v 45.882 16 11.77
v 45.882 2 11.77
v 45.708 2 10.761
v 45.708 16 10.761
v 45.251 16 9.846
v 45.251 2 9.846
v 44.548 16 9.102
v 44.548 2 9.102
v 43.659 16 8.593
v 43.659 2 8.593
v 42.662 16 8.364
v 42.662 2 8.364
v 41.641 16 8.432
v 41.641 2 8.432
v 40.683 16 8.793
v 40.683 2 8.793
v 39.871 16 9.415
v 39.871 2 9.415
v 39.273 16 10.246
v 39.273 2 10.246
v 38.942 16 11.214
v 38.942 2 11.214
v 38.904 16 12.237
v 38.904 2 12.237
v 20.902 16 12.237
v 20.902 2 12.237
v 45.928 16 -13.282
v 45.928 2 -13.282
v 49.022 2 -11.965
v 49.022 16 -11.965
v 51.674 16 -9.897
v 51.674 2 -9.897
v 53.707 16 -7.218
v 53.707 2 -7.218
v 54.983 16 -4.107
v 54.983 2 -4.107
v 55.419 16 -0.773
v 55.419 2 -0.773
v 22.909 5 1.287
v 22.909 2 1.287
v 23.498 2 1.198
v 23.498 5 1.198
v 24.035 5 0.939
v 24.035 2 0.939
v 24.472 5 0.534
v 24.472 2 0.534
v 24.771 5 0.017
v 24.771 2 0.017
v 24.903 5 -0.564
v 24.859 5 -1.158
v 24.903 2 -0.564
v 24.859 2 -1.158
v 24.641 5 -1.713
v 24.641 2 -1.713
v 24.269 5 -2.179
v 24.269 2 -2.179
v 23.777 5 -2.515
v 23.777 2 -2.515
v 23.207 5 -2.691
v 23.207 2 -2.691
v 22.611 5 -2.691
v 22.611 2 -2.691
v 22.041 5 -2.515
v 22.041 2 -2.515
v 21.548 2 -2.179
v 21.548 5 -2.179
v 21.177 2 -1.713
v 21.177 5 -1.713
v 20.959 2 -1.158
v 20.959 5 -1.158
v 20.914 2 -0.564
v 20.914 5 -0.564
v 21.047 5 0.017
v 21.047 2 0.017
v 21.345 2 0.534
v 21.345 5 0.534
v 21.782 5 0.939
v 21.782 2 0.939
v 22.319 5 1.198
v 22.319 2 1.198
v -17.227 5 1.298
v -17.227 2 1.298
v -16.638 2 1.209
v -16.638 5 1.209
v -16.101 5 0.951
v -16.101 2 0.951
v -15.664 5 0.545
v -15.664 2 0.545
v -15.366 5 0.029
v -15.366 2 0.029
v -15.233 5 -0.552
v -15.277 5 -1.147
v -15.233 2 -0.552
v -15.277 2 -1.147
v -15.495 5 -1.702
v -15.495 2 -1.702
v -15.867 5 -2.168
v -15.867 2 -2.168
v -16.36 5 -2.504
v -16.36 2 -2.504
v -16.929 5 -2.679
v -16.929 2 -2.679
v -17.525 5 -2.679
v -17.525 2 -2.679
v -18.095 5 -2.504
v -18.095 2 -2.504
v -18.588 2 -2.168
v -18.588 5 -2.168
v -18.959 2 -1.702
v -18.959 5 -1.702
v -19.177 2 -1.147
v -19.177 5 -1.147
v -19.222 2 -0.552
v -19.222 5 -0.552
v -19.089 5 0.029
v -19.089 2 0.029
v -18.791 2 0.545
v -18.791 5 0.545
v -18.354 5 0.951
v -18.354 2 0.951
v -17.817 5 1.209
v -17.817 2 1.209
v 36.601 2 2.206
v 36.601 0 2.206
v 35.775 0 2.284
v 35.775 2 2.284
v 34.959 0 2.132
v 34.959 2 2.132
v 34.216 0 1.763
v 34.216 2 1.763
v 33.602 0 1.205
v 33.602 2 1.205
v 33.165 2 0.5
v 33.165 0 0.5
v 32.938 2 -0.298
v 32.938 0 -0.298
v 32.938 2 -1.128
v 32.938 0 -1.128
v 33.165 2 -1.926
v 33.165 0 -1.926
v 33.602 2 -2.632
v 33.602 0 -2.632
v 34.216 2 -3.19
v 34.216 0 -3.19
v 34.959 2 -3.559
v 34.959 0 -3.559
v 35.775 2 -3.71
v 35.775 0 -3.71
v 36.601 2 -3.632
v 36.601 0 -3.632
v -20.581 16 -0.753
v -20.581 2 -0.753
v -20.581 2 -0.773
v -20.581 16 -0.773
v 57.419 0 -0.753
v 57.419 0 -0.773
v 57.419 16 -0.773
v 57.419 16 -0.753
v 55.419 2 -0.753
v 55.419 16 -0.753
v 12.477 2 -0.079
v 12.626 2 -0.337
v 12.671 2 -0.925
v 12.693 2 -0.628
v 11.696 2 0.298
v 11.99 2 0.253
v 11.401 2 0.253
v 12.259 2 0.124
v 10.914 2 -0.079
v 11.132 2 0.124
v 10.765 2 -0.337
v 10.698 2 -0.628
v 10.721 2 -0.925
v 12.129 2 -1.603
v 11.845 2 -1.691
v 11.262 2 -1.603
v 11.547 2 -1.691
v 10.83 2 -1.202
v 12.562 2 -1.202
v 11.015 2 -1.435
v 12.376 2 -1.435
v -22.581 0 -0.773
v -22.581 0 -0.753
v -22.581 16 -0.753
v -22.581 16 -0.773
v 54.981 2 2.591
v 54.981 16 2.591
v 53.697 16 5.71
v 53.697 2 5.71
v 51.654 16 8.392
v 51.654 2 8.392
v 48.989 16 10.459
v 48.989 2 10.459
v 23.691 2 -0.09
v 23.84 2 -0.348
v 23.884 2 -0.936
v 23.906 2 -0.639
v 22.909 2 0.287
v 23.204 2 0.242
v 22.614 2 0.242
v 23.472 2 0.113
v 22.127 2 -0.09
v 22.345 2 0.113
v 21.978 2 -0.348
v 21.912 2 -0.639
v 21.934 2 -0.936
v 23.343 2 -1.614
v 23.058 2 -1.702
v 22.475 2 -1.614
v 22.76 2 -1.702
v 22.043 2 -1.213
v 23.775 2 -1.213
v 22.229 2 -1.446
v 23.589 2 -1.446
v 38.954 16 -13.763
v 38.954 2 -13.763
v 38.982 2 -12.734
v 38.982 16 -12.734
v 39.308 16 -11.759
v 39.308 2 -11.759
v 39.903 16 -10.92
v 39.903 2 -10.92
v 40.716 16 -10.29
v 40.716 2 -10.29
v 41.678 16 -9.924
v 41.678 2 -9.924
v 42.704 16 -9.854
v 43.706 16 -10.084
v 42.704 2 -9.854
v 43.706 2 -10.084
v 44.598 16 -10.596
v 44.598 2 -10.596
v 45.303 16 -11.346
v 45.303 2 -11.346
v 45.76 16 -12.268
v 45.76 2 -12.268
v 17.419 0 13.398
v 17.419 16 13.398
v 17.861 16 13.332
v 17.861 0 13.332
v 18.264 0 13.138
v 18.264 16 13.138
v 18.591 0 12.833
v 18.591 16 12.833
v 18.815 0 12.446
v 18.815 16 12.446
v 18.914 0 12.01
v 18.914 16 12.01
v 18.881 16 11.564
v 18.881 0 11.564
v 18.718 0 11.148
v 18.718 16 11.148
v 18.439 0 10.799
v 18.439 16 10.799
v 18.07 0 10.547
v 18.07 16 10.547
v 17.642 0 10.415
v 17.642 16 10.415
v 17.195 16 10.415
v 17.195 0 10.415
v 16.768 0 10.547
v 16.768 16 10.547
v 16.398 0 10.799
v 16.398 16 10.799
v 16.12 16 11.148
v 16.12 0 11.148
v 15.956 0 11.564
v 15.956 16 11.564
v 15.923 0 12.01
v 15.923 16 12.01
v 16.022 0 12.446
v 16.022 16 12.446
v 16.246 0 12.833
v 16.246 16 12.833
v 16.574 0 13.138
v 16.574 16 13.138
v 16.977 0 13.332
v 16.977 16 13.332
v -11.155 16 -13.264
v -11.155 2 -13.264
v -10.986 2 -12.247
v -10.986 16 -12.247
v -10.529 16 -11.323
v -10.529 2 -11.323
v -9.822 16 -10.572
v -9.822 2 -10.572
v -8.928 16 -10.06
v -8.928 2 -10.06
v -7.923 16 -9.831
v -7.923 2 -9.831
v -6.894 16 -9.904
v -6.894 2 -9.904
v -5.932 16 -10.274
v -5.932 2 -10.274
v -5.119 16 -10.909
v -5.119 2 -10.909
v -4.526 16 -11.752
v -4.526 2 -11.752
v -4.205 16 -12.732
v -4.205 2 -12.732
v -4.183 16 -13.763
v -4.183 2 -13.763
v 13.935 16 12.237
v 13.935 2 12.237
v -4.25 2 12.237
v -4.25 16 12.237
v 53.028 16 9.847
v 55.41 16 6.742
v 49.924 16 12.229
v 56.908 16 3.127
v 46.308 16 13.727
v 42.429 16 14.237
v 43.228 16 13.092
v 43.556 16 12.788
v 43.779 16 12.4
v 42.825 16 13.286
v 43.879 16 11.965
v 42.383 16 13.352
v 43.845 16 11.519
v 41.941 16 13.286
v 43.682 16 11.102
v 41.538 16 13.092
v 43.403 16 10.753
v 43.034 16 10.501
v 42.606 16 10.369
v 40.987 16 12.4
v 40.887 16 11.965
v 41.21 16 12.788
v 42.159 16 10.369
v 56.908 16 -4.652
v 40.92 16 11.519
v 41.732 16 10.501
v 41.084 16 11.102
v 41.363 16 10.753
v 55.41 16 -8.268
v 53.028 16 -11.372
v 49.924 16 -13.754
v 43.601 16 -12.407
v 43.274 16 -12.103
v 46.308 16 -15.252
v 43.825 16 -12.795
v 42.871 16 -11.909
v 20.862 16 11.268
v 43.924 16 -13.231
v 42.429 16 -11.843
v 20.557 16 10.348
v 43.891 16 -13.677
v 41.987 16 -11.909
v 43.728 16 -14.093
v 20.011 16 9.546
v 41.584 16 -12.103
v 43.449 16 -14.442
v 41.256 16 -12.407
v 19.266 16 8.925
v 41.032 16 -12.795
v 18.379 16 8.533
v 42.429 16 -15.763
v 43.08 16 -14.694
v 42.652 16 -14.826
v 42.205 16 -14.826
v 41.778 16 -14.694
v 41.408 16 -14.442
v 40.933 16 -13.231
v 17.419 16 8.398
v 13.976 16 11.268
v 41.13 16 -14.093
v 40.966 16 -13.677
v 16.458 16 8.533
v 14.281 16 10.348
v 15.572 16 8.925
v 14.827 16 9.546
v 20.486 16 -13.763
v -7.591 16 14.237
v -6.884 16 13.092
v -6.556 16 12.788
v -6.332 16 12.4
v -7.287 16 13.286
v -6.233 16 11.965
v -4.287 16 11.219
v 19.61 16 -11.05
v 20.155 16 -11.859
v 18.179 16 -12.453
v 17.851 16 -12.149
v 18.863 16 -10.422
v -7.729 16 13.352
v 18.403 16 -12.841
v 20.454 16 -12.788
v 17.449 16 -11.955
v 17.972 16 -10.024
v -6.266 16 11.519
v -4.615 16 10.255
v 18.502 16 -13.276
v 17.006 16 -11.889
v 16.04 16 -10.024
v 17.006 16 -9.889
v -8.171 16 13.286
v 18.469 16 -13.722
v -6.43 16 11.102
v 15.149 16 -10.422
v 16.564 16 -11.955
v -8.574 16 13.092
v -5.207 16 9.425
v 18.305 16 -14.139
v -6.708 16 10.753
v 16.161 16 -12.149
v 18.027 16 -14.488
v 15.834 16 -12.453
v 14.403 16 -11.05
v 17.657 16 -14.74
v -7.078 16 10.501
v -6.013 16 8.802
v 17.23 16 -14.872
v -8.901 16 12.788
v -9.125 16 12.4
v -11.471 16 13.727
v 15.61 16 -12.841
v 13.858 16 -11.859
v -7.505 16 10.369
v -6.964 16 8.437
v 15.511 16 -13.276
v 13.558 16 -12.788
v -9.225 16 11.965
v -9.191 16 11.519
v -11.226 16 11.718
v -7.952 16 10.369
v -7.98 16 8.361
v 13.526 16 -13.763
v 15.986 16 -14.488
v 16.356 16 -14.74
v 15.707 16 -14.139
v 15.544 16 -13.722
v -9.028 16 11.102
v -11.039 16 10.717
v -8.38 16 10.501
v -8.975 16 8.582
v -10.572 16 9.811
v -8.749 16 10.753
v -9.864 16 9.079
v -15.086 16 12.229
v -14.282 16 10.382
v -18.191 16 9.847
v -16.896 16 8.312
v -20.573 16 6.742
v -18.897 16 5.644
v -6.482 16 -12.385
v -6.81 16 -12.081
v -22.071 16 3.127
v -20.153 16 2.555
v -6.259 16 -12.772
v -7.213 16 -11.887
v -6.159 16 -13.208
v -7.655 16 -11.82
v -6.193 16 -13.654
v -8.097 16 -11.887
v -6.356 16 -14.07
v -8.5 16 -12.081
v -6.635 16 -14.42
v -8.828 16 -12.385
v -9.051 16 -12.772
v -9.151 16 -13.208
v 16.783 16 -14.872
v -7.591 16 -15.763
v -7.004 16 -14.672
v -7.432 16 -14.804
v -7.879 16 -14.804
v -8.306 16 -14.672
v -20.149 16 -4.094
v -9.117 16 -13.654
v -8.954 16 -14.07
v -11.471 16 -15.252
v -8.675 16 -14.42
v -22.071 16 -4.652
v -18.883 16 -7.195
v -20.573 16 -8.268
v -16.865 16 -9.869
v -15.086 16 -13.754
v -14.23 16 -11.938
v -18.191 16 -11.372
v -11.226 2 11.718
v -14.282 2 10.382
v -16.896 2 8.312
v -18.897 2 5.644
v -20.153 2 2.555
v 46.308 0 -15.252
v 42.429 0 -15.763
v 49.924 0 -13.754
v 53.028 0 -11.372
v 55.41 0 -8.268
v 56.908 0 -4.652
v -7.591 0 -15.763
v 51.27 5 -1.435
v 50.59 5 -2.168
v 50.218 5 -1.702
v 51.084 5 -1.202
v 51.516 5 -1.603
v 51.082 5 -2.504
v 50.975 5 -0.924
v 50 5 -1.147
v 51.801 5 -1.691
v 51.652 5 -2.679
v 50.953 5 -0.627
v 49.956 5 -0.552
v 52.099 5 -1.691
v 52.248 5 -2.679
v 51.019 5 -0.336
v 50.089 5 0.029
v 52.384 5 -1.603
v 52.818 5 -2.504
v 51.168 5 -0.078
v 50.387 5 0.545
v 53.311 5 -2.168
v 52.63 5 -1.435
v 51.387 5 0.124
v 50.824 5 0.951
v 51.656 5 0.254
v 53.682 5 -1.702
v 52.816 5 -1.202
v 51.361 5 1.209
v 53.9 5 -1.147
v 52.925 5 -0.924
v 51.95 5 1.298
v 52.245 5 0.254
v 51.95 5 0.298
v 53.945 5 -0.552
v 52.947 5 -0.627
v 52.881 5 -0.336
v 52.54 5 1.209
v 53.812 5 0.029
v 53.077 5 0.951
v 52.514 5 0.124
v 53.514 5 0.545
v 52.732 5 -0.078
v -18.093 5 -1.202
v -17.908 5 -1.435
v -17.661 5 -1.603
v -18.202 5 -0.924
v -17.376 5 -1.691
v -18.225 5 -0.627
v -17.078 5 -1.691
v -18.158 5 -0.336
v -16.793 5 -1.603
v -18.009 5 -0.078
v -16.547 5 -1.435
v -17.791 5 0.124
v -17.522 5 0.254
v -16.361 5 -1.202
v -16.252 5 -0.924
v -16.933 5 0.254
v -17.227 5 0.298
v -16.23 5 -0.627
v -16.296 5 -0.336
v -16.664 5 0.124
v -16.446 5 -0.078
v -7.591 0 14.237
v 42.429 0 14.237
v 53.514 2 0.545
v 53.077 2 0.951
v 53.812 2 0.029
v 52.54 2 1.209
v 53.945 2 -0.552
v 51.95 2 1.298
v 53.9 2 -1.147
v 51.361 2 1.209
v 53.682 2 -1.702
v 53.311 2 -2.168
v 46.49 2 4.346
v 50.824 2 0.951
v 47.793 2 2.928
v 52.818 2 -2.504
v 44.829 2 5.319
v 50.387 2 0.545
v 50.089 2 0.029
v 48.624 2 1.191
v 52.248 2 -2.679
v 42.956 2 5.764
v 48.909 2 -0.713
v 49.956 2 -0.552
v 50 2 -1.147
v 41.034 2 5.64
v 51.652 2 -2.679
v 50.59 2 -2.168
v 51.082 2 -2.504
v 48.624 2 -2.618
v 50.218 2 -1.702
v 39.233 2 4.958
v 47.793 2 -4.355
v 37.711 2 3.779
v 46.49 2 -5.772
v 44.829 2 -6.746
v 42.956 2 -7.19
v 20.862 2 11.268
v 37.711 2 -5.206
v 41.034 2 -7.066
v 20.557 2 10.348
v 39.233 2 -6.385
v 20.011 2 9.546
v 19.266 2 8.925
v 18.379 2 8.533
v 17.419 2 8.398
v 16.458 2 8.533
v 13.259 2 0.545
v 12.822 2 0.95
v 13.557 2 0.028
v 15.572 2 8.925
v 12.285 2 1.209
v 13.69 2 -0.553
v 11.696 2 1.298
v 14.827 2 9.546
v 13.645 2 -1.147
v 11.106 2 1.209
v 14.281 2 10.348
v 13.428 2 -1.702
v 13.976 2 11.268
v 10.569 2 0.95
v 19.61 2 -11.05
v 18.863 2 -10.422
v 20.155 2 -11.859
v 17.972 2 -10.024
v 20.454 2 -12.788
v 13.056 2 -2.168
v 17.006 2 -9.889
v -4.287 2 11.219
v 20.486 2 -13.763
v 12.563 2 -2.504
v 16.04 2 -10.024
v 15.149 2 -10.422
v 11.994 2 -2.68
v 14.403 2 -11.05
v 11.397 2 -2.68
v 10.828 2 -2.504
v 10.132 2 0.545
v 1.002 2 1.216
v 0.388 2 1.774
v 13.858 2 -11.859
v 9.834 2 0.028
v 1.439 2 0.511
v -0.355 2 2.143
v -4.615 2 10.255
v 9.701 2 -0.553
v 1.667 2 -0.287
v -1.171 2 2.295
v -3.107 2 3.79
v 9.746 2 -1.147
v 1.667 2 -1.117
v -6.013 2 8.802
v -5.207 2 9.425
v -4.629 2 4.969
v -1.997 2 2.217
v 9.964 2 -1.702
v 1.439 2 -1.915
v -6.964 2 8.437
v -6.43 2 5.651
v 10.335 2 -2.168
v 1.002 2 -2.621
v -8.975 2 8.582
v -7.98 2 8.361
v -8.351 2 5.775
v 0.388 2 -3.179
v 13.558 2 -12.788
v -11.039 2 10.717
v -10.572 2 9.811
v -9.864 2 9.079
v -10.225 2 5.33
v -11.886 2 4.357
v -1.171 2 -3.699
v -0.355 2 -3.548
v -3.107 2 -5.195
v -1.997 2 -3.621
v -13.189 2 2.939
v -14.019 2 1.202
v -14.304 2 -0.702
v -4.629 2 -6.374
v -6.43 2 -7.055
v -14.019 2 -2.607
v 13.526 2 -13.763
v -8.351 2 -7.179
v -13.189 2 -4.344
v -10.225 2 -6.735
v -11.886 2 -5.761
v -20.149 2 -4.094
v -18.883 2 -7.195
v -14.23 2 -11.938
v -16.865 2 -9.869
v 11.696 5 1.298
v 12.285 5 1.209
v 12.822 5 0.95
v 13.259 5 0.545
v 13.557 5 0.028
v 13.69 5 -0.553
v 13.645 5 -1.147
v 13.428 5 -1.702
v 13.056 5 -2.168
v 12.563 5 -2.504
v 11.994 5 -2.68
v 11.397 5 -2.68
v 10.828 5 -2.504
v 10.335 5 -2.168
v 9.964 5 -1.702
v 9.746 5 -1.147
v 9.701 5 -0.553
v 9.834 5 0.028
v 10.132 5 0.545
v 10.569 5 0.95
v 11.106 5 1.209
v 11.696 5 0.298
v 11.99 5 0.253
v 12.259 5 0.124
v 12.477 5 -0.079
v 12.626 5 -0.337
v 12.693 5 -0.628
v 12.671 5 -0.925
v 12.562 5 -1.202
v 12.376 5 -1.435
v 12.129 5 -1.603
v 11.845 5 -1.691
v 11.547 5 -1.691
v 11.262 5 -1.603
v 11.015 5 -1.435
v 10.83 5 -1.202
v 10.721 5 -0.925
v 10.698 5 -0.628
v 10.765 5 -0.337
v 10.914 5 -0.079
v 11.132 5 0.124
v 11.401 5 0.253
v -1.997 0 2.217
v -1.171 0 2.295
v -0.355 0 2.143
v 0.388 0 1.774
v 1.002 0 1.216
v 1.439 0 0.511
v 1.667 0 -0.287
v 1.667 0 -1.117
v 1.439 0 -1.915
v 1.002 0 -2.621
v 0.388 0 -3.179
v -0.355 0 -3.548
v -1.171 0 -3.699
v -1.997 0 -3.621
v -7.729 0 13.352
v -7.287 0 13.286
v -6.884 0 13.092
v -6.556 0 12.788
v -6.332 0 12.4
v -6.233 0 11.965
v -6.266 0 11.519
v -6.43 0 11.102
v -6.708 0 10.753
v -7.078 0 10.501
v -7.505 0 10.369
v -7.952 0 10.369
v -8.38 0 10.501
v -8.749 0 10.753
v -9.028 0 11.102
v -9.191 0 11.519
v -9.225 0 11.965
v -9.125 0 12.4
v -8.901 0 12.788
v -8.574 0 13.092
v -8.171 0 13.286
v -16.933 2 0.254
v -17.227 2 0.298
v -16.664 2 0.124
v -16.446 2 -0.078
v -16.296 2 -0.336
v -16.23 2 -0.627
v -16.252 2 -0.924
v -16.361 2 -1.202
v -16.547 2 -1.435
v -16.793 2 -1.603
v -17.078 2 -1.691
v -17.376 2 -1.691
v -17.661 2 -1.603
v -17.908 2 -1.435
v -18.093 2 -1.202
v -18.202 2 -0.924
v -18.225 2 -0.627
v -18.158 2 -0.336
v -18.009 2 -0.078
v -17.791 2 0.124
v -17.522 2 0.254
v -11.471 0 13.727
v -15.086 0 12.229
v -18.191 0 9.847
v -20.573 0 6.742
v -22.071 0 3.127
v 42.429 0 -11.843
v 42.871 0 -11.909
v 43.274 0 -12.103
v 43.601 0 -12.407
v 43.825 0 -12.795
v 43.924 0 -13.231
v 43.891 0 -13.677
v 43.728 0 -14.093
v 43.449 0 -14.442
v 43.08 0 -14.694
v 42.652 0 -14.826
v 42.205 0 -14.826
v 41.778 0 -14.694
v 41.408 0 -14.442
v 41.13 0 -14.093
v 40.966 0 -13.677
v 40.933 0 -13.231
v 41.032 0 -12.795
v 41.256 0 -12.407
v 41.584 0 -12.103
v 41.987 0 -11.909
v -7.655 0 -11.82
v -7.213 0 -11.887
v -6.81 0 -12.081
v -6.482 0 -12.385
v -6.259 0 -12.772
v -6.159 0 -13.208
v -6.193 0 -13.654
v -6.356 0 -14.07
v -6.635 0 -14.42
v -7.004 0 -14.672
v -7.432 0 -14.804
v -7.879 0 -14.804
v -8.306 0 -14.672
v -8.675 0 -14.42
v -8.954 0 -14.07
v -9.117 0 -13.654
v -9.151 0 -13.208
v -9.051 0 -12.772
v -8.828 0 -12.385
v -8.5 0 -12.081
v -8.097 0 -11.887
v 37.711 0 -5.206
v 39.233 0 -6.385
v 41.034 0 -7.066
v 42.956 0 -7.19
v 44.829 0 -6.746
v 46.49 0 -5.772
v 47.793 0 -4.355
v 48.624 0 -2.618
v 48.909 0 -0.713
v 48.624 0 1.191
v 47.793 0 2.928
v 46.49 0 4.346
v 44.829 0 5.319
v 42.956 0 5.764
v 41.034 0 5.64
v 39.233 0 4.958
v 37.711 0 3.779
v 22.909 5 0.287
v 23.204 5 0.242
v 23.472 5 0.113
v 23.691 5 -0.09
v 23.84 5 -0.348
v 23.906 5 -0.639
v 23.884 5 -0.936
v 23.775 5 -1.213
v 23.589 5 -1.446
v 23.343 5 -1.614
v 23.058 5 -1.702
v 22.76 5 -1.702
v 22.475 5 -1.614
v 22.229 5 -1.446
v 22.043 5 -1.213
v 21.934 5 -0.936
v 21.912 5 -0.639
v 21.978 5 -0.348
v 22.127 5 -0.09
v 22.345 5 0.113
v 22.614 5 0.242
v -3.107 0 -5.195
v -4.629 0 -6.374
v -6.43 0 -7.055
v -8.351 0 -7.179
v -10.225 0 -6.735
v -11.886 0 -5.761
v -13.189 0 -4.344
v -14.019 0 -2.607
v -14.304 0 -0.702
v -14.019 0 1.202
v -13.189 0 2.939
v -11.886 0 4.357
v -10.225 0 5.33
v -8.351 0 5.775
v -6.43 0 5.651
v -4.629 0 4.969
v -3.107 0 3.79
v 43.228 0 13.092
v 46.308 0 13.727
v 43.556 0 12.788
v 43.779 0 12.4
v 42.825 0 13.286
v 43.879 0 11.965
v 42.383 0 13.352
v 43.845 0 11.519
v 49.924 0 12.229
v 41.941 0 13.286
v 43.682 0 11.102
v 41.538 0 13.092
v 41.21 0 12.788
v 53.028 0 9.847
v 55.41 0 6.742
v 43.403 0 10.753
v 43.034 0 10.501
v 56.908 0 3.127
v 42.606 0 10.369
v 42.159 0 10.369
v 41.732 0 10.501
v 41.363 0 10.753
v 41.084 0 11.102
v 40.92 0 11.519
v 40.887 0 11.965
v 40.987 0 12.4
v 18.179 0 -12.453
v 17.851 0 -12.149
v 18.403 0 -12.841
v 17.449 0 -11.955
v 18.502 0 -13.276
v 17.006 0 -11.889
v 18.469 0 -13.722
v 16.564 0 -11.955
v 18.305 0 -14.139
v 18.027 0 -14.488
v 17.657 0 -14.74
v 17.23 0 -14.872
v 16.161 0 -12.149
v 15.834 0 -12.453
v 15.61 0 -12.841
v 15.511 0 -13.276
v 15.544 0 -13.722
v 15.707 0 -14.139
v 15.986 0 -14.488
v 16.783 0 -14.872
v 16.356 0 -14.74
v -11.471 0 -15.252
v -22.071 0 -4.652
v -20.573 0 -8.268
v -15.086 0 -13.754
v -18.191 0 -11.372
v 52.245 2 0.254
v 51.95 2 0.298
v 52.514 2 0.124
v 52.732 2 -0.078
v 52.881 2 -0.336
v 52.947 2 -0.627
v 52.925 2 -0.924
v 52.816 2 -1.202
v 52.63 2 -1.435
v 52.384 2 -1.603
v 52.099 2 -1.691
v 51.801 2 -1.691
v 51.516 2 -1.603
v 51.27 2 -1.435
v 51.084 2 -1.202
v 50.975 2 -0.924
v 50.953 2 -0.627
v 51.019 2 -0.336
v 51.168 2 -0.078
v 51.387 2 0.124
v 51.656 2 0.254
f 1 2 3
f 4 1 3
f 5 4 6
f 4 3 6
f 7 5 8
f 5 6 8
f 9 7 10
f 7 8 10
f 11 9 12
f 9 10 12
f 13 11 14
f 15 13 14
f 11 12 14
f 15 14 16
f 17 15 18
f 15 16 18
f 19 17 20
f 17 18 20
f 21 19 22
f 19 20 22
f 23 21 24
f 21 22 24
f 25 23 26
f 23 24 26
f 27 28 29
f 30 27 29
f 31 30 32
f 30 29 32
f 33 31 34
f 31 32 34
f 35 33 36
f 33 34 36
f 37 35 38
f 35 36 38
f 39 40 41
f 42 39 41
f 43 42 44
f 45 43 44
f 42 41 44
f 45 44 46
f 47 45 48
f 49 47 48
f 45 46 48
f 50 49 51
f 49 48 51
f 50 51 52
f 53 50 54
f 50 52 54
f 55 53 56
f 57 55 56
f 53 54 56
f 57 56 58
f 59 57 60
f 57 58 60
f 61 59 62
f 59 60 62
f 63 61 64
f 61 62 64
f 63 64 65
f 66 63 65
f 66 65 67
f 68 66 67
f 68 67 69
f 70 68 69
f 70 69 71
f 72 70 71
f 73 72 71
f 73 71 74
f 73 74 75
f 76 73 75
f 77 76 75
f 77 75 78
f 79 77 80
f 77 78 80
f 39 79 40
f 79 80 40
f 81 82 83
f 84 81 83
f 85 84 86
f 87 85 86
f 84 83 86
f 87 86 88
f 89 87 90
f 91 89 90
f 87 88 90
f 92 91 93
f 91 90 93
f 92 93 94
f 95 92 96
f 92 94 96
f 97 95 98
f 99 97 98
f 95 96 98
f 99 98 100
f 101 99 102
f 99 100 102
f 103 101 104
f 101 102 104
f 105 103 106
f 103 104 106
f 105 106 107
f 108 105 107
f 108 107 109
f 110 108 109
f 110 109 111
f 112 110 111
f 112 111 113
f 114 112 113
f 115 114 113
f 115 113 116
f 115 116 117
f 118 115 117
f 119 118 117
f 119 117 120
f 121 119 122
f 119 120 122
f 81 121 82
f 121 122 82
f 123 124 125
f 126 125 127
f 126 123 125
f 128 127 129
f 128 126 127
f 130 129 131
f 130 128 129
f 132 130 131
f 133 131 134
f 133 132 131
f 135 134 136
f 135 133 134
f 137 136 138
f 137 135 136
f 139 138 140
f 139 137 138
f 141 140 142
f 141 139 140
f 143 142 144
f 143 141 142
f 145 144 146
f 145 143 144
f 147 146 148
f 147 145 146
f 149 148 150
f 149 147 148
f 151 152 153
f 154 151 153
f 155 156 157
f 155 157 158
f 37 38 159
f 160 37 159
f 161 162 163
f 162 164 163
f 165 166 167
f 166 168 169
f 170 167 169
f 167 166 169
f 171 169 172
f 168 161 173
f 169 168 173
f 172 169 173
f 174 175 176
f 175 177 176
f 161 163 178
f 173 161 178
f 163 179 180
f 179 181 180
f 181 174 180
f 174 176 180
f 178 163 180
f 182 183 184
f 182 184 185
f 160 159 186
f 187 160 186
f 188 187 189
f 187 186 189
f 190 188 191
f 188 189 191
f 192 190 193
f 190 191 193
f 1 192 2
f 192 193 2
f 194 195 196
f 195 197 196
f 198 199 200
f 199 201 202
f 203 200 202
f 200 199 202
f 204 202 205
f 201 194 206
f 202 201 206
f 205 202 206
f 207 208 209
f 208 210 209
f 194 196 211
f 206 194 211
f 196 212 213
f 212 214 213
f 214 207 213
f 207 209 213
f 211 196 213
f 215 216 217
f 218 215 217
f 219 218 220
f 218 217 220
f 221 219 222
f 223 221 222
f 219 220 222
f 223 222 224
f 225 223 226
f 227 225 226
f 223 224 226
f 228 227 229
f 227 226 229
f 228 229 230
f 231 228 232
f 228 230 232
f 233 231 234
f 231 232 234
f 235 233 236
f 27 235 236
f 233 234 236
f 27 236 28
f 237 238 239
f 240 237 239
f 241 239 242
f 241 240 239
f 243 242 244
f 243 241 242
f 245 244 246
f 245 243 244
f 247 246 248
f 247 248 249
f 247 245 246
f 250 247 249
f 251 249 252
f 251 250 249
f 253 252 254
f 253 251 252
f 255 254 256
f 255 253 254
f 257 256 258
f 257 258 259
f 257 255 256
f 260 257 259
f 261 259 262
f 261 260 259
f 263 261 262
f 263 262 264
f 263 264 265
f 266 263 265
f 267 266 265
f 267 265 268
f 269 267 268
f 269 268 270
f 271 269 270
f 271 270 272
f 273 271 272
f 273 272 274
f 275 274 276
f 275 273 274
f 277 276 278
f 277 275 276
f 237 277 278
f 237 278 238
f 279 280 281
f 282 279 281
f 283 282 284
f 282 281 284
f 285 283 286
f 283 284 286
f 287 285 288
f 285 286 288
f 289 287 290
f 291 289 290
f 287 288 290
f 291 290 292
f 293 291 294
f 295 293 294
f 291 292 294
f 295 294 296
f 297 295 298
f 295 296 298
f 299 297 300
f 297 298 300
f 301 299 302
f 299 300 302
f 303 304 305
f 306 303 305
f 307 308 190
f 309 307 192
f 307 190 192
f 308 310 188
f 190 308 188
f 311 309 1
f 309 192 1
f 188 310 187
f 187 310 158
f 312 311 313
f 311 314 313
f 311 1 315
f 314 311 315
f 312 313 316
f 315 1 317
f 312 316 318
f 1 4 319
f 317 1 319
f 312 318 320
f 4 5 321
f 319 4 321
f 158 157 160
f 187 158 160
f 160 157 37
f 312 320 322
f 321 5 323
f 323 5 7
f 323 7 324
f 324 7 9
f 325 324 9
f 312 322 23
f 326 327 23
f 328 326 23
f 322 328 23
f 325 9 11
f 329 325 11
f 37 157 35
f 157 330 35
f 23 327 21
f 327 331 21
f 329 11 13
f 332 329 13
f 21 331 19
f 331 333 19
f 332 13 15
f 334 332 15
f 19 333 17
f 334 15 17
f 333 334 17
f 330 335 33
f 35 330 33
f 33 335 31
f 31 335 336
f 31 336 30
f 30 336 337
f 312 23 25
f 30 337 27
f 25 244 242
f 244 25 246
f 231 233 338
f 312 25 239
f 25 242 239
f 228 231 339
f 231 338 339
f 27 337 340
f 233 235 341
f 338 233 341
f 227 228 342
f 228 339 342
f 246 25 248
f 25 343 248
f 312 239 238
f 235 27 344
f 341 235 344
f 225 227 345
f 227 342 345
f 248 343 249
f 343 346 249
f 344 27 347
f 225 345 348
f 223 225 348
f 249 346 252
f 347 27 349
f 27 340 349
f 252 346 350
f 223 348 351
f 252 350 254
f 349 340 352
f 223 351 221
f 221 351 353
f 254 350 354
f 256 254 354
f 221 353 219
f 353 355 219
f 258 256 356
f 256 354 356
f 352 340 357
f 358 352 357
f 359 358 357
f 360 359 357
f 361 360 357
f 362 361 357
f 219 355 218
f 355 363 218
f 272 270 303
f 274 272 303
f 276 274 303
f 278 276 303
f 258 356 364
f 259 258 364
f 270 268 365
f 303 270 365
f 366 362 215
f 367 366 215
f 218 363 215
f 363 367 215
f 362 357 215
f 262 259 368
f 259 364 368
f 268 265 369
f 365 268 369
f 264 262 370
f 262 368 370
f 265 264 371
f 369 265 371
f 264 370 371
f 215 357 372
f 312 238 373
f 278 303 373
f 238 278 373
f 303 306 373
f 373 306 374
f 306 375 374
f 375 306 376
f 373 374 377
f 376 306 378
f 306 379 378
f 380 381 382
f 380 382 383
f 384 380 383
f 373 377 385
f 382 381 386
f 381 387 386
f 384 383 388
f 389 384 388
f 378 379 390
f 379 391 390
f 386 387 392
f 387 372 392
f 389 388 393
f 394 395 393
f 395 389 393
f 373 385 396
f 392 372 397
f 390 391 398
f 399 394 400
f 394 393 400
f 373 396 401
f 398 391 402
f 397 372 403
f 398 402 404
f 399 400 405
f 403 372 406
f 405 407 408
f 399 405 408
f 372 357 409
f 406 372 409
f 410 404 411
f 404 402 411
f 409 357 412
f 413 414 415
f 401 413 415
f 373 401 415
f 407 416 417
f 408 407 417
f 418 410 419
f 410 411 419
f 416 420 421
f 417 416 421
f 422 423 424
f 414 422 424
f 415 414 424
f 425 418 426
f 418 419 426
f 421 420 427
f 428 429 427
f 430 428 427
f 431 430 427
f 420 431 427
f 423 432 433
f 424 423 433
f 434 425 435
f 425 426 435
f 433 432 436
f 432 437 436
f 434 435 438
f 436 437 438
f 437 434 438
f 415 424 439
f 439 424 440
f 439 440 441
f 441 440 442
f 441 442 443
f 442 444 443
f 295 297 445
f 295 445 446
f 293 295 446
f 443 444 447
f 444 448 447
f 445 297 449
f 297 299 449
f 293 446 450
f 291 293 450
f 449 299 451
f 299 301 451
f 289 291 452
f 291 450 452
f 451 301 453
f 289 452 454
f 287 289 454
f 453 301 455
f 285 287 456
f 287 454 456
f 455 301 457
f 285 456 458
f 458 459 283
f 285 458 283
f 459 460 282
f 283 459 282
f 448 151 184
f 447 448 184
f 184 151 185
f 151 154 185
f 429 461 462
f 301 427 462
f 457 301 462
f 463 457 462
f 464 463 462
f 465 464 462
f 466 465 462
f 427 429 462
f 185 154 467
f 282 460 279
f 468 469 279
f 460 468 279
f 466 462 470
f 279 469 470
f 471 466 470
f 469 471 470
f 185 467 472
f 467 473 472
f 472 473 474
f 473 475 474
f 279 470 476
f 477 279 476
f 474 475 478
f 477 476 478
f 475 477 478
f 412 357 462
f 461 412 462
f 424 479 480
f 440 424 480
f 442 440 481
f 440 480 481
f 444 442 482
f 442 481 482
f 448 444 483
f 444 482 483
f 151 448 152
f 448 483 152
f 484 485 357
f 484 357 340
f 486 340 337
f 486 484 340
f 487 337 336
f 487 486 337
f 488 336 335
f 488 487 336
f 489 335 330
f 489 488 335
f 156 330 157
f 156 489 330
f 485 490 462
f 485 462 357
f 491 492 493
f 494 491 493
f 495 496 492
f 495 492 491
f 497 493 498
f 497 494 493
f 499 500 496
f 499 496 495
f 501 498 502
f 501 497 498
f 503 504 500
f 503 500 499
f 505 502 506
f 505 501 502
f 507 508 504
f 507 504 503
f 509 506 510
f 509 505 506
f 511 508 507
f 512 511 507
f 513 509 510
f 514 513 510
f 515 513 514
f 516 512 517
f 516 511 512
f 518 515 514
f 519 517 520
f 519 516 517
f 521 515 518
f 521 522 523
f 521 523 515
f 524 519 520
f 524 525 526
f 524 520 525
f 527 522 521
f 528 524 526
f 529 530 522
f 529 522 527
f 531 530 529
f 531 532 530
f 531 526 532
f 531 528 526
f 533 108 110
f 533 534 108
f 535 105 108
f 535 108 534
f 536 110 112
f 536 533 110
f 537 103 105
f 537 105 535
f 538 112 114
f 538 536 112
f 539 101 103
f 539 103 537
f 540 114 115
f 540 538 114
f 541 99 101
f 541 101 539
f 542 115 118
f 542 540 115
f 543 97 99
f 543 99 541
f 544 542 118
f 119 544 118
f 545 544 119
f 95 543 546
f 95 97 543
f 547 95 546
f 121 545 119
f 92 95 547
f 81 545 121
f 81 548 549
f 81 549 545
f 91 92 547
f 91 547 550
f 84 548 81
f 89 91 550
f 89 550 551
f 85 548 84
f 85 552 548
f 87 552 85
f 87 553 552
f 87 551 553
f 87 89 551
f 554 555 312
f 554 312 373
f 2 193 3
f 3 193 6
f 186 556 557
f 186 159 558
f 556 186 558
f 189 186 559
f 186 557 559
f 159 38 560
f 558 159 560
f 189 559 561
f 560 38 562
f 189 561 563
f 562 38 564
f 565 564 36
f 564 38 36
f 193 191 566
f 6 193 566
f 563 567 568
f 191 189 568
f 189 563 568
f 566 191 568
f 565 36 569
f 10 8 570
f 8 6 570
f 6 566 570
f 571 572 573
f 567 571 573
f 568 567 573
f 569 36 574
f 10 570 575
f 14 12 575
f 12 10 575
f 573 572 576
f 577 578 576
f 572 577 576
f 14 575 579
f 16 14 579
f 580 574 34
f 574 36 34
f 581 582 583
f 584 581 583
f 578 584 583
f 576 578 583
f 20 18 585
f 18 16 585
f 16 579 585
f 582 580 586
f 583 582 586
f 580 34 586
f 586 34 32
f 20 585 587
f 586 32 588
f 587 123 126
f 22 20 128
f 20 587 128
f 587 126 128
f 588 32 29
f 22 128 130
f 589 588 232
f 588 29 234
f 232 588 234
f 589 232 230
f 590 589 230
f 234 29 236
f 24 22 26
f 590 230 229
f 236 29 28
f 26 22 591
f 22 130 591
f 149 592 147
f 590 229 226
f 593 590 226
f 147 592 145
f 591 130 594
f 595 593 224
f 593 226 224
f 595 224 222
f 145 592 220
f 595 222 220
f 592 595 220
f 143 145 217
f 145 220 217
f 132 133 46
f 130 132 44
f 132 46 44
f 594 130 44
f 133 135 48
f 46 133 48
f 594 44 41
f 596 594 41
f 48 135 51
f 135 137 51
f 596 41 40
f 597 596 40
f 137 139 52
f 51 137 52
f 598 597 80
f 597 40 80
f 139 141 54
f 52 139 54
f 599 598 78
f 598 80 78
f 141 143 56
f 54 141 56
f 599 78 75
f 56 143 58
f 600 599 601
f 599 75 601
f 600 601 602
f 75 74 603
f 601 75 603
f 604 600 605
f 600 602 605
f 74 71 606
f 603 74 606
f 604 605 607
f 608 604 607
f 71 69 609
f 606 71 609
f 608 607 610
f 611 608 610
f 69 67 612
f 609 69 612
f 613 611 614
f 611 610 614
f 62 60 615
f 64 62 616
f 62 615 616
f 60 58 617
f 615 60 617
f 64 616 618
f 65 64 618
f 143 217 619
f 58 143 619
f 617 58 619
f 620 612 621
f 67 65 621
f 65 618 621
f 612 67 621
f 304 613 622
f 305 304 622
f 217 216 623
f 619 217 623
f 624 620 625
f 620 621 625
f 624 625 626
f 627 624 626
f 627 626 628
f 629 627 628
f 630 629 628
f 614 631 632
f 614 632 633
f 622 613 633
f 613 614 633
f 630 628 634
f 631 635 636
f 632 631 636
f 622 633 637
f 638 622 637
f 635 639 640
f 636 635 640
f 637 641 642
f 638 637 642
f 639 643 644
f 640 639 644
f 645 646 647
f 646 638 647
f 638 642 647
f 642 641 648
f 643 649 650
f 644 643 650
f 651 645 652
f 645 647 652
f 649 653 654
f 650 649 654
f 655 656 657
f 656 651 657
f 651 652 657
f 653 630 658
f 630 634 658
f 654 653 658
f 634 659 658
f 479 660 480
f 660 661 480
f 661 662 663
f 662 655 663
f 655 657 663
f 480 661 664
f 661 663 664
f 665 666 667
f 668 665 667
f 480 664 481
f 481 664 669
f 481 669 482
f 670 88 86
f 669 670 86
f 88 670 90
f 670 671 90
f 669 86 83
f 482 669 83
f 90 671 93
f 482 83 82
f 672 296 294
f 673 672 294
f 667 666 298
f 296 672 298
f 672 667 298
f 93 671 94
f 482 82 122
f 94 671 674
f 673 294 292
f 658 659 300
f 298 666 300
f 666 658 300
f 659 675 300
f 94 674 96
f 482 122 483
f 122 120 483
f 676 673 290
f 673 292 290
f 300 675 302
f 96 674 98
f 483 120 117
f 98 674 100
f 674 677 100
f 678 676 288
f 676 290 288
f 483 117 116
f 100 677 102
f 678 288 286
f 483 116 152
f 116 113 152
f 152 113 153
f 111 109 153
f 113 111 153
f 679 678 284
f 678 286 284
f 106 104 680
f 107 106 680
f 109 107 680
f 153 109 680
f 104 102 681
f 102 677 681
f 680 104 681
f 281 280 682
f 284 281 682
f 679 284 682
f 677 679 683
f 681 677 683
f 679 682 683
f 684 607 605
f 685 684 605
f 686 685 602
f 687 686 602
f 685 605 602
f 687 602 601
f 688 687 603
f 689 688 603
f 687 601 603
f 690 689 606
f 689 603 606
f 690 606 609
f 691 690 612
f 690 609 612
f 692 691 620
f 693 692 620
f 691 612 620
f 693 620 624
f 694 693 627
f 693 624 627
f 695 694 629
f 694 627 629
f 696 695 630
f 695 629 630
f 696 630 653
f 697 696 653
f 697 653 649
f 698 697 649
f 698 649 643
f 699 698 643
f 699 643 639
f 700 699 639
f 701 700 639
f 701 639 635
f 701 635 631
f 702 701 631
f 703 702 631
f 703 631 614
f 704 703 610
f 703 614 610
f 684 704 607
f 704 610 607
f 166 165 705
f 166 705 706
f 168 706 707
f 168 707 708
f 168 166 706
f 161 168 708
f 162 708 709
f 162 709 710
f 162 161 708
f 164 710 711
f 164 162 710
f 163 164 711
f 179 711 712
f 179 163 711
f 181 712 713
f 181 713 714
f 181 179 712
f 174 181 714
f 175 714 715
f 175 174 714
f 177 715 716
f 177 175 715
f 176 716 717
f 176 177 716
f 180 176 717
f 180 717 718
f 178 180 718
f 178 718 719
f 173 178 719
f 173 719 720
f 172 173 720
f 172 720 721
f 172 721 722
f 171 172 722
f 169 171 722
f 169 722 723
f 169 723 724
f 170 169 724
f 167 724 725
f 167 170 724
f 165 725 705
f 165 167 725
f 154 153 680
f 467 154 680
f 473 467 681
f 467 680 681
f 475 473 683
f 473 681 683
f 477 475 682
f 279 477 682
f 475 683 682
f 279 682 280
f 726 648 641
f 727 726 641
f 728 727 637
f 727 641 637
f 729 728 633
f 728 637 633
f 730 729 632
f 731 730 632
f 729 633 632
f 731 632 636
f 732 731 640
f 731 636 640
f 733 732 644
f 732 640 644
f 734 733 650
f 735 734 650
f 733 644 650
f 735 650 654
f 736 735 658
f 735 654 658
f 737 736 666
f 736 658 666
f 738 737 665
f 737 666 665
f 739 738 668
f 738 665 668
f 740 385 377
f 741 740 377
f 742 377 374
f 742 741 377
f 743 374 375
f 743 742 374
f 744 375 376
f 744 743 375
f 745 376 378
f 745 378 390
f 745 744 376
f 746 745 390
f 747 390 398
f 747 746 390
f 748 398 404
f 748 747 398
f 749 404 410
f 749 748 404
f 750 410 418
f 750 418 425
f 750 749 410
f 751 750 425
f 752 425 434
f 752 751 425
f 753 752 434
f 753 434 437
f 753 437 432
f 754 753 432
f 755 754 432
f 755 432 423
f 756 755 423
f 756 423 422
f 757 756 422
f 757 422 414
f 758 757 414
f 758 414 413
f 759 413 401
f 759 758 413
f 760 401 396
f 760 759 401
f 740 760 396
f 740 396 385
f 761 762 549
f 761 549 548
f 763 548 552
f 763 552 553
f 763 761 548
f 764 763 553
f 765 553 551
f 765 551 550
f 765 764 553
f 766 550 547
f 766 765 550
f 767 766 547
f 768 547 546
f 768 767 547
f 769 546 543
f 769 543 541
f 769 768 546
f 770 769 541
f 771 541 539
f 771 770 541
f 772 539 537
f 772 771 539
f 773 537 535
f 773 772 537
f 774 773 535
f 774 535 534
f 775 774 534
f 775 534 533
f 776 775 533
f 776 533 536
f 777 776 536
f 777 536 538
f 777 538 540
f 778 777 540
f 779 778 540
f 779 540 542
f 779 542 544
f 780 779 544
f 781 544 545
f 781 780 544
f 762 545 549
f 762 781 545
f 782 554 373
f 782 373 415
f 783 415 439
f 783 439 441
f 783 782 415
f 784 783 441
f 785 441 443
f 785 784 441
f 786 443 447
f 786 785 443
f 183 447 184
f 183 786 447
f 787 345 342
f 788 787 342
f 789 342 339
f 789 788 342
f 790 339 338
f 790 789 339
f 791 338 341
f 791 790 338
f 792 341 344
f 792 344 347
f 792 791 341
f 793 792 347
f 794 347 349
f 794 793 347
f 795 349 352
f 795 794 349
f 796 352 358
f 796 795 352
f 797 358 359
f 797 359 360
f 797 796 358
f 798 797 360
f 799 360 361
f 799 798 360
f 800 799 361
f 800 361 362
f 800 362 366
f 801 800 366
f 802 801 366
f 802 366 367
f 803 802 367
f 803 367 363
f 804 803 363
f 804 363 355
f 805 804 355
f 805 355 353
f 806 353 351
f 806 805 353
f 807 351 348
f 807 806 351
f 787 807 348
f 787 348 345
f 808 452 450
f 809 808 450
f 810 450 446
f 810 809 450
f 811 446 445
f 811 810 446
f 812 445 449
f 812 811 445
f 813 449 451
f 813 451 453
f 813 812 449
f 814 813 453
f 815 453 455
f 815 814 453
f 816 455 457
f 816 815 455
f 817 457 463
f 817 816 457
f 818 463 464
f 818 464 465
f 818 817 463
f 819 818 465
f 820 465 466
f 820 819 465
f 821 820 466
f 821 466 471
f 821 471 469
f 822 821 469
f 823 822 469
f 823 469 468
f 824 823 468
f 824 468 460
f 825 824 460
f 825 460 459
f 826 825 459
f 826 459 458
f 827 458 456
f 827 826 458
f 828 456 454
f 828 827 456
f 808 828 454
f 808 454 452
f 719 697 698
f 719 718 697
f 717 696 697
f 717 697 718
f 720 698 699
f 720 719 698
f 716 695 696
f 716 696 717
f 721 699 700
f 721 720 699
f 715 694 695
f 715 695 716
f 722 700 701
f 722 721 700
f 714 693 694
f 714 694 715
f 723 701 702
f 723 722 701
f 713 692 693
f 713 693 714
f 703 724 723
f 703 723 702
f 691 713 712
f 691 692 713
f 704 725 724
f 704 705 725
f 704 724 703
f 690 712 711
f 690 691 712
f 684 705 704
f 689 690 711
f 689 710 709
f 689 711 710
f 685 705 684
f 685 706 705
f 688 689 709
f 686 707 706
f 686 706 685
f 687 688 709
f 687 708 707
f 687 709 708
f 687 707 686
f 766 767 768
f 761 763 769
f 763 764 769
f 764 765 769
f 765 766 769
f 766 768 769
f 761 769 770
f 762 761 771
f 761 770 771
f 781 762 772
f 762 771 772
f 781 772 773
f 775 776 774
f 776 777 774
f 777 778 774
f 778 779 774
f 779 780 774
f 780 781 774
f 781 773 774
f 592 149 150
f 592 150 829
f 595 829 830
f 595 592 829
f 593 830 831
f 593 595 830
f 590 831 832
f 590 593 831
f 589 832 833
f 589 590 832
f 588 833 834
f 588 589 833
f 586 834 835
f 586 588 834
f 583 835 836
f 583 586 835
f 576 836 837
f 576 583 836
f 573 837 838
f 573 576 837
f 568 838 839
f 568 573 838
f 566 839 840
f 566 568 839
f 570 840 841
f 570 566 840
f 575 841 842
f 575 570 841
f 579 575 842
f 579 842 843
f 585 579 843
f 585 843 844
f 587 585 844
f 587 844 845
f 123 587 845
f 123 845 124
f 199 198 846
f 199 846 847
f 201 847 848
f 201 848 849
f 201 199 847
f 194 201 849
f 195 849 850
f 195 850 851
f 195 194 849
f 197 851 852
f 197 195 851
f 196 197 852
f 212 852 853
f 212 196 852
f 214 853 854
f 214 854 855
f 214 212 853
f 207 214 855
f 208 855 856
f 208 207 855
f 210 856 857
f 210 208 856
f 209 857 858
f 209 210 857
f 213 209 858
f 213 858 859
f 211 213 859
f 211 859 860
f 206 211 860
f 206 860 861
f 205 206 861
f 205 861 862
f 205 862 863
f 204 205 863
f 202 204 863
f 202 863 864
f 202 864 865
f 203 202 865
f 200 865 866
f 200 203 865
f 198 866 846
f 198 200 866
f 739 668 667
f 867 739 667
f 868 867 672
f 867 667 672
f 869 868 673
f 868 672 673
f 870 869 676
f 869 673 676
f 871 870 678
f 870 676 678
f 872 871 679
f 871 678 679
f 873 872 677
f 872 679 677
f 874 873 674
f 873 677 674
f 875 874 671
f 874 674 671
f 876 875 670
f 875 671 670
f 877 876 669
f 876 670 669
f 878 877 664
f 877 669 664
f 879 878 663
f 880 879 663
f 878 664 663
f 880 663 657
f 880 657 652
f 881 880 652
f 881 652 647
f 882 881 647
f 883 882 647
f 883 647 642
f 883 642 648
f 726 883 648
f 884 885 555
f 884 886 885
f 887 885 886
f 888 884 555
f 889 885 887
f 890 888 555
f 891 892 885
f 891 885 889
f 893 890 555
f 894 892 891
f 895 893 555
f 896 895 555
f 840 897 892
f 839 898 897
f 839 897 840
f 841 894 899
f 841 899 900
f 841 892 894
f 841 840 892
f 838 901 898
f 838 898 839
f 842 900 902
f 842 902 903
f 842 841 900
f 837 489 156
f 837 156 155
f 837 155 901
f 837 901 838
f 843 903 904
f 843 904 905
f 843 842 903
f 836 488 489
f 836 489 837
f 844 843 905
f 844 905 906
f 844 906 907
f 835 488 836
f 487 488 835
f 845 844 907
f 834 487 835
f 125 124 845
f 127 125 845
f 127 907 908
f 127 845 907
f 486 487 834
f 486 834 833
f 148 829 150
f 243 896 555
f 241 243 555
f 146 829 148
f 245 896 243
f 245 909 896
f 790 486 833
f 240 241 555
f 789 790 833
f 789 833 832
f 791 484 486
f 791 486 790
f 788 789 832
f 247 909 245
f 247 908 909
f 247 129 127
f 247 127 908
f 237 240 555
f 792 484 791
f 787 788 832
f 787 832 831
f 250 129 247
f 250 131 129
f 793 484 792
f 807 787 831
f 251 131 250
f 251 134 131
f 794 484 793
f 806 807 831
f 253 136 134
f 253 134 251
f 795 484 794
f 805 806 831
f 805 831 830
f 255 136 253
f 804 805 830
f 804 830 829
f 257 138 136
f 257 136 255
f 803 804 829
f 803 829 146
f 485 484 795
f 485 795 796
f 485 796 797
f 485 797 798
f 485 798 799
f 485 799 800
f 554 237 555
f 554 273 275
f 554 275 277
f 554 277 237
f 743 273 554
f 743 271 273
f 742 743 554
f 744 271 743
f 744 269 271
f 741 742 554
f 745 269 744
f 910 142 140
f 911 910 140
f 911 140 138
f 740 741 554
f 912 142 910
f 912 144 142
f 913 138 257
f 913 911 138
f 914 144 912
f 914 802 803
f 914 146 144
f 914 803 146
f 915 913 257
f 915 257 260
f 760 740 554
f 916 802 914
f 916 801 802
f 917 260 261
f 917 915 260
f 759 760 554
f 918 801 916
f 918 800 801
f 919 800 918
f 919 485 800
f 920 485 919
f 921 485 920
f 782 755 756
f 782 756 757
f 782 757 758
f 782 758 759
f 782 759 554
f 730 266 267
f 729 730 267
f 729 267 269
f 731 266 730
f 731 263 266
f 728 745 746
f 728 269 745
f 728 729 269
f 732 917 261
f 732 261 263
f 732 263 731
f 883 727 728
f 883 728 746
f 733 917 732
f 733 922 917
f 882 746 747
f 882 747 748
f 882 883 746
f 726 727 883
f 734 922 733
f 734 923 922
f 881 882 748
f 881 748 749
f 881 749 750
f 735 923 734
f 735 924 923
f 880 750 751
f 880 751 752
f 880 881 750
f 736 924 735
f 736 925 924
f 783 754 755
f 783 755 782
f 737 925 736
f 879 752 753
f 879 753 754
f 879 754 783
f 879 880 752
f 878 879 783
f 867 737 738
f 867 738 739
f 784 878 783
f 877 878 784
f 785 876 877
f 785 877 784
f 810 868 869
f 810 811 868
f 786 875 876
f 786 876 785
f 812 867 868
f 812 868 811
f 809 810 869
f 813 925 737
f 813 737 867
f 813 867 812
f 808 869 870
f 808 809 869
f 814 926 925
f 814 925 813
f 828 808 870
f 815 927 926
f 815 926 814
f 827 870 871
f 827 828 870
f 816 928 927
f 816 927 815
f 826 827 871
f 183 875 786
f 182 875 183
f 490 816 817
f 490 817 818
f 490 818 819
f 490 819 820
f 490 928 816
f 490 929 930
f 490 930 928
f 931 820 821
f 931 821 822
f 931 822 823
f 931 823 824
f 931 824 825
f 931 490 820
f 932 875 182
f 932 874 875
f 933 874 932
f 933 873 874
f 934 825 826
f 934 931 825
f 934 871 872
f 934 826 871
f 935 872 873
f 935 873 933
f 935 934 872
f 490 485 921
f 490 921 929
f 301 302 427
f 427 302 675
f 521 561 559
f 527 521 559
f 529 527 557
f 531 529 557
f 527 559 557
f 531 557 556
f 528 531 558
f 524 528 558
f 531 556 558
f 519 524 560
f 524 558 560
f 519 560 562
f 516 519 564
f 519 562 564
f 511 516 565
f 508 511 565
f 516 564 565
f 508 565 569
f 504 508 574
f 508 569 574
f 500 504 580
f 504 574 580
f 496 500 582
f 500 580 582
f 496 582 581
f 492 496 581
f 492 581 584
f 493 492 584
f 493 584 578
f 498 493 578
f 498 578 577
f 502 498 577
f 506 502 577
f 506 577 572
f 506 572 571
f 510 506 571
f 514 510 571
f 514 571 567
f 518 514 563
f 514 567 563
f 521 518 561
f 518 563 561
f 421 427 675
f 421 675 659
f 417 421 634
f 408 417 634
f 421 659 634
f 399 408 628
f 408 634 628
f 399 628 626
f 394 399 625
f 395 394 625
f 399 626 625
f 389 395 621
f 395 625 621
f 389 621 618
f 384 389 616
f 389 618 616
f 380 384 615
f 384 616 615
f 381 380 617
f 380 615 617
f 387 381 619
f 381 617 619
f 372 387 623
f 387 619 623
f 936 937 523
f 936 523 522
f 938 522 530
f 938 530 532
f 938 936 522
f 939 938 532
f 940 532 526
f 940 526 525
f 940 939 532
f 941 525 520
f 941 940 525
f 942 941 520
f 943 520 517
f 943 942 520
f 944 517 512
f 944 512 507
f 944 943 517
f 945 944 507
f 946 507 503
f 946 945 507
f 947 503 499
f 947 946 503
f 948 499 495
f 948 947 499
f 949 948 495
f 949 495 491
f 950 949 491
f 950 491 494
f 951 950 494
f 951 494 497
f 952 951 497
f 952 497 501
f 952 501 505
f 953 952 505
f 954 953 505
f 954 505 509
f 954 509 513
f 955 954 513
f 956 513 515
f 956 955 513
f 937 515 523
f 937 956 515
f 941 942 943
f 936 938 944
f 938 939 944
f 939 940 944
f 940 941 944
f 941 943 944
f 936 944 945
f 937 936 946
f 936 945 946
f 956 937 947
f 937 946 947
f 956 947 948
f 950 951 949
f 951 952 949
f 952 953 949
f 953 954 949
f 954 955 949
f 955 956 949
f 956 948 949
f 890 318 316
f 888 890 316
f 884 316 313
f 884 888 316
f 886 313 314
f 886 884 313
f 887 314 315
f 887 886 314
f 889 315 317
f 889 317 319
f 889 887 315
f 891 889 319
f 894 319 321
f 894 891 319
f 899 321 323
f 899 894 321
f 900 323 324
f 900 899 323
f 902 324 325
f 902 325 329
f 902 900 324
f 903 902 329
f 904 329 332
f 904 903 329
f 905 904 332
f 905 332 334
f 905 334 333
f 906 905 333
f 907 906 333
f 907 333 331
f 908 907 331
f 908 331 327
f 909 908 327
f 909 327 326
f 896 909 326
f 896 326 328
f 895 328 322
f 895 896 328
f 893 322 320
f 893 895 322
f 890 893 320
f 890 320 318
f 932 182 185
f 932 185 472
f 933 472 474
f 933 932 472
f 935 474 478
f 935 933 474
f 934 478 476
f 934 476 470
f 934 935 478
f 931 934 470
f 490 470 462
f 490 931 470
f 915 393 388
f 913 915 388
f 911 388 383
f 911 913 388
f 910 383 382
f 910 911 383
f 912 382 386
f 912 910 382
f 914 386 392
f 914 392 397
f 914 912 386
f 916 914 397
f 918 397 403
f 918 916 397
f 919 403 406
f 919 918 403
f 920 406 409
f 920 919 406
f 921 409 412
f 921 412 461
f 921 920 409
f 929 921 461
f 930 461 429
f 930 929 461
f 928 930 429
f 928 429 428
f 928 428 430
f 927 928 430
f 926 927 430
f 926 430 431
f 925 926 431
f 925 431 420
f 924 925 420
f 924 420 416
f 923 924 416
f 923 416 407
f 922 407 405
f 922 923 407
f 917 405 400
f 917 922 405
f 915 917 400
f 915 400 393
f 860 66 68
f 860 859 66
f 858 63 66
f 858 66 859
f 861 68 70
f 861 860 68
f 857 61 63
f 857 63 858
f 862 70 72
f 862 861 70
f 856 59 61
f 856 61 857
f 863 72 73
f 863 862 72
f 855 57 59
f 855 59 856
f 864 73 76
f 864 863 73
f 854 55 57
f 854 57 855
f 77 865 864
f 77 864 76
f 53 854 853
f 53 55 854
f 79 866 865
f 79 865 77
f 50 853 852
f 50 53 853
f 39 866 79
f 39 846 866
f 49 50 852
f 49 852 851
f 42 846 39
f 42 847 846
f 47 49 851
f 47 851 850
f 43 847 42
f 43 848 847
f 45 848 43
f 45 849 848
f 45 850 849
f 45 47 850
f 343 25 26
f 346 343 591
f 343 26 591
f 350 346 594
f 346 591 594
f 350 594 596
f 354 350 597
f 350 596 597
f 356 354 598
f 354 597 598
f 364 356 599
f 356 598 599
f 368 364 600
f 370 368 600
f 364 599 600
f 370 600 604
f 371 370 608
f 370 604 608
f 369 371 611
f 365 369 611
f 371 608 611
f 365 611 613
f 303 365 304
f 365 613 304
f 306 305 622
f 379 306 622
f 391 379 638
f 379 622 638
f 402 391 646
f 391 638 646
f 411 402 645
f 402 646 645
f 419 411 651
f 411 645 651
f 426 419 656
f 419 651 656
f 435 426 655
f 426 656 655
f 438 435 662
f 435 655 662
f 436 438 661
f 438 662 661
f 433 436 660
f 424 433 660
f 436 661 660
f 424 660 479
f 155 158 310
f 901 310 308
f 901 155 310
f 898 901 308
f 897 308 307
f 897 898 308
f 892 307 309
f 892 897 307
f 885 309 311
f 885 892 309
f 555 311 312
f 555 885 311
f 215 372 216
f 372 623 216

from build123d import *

# Parameters (mm, degrees)
SKETCH3_R            = 1.5
BOSS_EXTRUDE9_DEPTH  = 16
SHELL6_T             = -2
CUT_EXTRUDE3_DEPTH   = 16
SKETCH12_R           = 2
SKETCH12_R_2         = 1
BOSS_EXTRUDE16_DEPTH = 3


with BuildPart() as part:
    # Sketch3 → Boss-Extrude9 (new body)
    with BuildSketch(Plane(origin=(0, 0, 0), x_dir=(1, 0, 0), z_dir=(0, 1, 0))):
        with BuildLine():
            Line((-7.591309311, 15.762711864), (42.428690689, 15.762711864))
            ThreePointArc((42.428690689, 15.762711864), (53.028221339, 11.372242514), (57.418690689, 0.772711864))
            Line((57.418690689, 0.772711864), (57.418690689, 0.752711864))
            ThreePointArc((57.418690689, 0.752711864), (53.028221339, -9.846818786), (42.428690689, -14.237288136))
            Line((42.428690689, -14.237288136), (-7.591309311, -14.237288136))
            ThreePointArc((-7.591309311, -14.237288136), (-18.190839961, -9.846818786), (-22.581309311, 0.752711864))
            Line((-22.581309311, 0.752711864), (-22.581309311, 0.772711864))
            ThreePointArc((-22.581309311, 0.772711864), (-18.190839961, 11.372242514), (-7.591309311, 15.762711864))
        make_face()
        with Locations(Location((-7.655094993, 13.320472835, 0), (0, 0, 270))):
            Circle(SKETCH3_R, mode=Mode.SUBTRACT)
        with Locations(Location((-7.728737311, -11.852412523, 0), (0, 0, 270))):
            Circle(SKETCH3_R, mode=Mode.SUBTRACT)
        with Locations(Location((17.418690689, -11.898221857, 0), (0, 0, 270))):
            Circle(SKETCH3_R, mode=Mode.SUBTRACT)
        with Locations(Location((17.006406688, 13.388530255, 0), (0, 0, 270))):
            Circle(SKETCH3_R, mode=Mode.SUBTRACT)
        with Locations(Location((42.428690689, 13.342720921, 0), (0, 0, 270))):
            Circle(SKETCH3_R, mode=Mode.SUBTRACT)
        with Locations(Location((42.382881356, -11.852412523, 0), (0, 0, 270))):
            Circle(SKETCH3_R, mode=Mode.SUBTRACT)
    extrude(amount=BOSS_EXTRUDE9_DEPTH)

    # Shell6
    shell6_openings = [part.faces().sort_by_distance(p)[0] for p in [
        (17.420843578, 16, -0.763128508),
    ]]
    offset(amount=SHELL6_T, openings=shell6_openings)

    # Sketch6 → Cut-Extrude3 (cut)
    with BuildSketch(Plane(origin=(0, 2, 0), x_dir=(1, 0, 0), z_dir=(0, 1, 0))):
        with BuildLine():
            ThreePointArc((36.601110118, 3.632363117), (48.908802425, 0.713337584), (36.601110118, -2.205687948))
            ThreePointArc((36.601110118, -2.205687948), (32.908802425, 0.713337584), (36.601110118, 3.632363117))
        make_face()
        with BuildLine():
            ThreePointArc((-1.996728909, 3.621416563), (-14.304421217, 0.70239103), (-1.996728909, -2.216634502))
            ThreePointArc((-1.996728909, -2.216634502), (1.695578783, 0.70239103), (-1.996728909, 3.621416563))
        make_face()
    extrude(amount=-CUT_EXTRUDE3_DEPTH, mode=Mode.SUBTRACT)

    # Sketch12 → Boss-Extrude16 (add)
    with BuildSketch(Plane(origin=(0, 2, 0), x_dir=(1, 0, 0), z_dir=(0, 1, 0))):
        with Locations(Location((51.950259108, 0.701799296, 0), (0, 0, 270))):
            Circle(SKETCH12_R)
        with Locations(Location((51.950259108, 0.701799296, 0), (0, 0, 270))):
            Circle(SKETCH12_R_2, mode=Mode.SUBTRACT)
        with Locations(Location((-17.227337288, 0.701799296, 0), (0, 0, 270))):
            Circle(SKETCH12_R)
        with Locations(Location((-17.227337288, 0.701799296, 0), (0, 0, 270))):
            Circle(SKETCH12_R_2, mode=Mode.SUBTRACT)
        with Locations(Location((11.695578783, 0.70239103, 0), (0, 0, 270))):
            Circle(SKETCH12_R)
        with Locations(Location((11.695578783, 0.70239103, 0), (0, 0, 270))):
            Circle(SKETCH12_R_2, mode=Mode.SUBTRACT)
        with Locations(Location((22.908802425, 0.713337584, 0), (0, 0, 270))):
            Circle(SKETCH12_R)
        with Locations(Location((22.908802425, 0.713337584, 0), (0, 0, 270))):
            Circle(SKETCH12_R_2, mode=Mode.SUBTRACT)
    extrude(amount=BOSS_EXTRUDE16_DEPTH)


solid = part.part
